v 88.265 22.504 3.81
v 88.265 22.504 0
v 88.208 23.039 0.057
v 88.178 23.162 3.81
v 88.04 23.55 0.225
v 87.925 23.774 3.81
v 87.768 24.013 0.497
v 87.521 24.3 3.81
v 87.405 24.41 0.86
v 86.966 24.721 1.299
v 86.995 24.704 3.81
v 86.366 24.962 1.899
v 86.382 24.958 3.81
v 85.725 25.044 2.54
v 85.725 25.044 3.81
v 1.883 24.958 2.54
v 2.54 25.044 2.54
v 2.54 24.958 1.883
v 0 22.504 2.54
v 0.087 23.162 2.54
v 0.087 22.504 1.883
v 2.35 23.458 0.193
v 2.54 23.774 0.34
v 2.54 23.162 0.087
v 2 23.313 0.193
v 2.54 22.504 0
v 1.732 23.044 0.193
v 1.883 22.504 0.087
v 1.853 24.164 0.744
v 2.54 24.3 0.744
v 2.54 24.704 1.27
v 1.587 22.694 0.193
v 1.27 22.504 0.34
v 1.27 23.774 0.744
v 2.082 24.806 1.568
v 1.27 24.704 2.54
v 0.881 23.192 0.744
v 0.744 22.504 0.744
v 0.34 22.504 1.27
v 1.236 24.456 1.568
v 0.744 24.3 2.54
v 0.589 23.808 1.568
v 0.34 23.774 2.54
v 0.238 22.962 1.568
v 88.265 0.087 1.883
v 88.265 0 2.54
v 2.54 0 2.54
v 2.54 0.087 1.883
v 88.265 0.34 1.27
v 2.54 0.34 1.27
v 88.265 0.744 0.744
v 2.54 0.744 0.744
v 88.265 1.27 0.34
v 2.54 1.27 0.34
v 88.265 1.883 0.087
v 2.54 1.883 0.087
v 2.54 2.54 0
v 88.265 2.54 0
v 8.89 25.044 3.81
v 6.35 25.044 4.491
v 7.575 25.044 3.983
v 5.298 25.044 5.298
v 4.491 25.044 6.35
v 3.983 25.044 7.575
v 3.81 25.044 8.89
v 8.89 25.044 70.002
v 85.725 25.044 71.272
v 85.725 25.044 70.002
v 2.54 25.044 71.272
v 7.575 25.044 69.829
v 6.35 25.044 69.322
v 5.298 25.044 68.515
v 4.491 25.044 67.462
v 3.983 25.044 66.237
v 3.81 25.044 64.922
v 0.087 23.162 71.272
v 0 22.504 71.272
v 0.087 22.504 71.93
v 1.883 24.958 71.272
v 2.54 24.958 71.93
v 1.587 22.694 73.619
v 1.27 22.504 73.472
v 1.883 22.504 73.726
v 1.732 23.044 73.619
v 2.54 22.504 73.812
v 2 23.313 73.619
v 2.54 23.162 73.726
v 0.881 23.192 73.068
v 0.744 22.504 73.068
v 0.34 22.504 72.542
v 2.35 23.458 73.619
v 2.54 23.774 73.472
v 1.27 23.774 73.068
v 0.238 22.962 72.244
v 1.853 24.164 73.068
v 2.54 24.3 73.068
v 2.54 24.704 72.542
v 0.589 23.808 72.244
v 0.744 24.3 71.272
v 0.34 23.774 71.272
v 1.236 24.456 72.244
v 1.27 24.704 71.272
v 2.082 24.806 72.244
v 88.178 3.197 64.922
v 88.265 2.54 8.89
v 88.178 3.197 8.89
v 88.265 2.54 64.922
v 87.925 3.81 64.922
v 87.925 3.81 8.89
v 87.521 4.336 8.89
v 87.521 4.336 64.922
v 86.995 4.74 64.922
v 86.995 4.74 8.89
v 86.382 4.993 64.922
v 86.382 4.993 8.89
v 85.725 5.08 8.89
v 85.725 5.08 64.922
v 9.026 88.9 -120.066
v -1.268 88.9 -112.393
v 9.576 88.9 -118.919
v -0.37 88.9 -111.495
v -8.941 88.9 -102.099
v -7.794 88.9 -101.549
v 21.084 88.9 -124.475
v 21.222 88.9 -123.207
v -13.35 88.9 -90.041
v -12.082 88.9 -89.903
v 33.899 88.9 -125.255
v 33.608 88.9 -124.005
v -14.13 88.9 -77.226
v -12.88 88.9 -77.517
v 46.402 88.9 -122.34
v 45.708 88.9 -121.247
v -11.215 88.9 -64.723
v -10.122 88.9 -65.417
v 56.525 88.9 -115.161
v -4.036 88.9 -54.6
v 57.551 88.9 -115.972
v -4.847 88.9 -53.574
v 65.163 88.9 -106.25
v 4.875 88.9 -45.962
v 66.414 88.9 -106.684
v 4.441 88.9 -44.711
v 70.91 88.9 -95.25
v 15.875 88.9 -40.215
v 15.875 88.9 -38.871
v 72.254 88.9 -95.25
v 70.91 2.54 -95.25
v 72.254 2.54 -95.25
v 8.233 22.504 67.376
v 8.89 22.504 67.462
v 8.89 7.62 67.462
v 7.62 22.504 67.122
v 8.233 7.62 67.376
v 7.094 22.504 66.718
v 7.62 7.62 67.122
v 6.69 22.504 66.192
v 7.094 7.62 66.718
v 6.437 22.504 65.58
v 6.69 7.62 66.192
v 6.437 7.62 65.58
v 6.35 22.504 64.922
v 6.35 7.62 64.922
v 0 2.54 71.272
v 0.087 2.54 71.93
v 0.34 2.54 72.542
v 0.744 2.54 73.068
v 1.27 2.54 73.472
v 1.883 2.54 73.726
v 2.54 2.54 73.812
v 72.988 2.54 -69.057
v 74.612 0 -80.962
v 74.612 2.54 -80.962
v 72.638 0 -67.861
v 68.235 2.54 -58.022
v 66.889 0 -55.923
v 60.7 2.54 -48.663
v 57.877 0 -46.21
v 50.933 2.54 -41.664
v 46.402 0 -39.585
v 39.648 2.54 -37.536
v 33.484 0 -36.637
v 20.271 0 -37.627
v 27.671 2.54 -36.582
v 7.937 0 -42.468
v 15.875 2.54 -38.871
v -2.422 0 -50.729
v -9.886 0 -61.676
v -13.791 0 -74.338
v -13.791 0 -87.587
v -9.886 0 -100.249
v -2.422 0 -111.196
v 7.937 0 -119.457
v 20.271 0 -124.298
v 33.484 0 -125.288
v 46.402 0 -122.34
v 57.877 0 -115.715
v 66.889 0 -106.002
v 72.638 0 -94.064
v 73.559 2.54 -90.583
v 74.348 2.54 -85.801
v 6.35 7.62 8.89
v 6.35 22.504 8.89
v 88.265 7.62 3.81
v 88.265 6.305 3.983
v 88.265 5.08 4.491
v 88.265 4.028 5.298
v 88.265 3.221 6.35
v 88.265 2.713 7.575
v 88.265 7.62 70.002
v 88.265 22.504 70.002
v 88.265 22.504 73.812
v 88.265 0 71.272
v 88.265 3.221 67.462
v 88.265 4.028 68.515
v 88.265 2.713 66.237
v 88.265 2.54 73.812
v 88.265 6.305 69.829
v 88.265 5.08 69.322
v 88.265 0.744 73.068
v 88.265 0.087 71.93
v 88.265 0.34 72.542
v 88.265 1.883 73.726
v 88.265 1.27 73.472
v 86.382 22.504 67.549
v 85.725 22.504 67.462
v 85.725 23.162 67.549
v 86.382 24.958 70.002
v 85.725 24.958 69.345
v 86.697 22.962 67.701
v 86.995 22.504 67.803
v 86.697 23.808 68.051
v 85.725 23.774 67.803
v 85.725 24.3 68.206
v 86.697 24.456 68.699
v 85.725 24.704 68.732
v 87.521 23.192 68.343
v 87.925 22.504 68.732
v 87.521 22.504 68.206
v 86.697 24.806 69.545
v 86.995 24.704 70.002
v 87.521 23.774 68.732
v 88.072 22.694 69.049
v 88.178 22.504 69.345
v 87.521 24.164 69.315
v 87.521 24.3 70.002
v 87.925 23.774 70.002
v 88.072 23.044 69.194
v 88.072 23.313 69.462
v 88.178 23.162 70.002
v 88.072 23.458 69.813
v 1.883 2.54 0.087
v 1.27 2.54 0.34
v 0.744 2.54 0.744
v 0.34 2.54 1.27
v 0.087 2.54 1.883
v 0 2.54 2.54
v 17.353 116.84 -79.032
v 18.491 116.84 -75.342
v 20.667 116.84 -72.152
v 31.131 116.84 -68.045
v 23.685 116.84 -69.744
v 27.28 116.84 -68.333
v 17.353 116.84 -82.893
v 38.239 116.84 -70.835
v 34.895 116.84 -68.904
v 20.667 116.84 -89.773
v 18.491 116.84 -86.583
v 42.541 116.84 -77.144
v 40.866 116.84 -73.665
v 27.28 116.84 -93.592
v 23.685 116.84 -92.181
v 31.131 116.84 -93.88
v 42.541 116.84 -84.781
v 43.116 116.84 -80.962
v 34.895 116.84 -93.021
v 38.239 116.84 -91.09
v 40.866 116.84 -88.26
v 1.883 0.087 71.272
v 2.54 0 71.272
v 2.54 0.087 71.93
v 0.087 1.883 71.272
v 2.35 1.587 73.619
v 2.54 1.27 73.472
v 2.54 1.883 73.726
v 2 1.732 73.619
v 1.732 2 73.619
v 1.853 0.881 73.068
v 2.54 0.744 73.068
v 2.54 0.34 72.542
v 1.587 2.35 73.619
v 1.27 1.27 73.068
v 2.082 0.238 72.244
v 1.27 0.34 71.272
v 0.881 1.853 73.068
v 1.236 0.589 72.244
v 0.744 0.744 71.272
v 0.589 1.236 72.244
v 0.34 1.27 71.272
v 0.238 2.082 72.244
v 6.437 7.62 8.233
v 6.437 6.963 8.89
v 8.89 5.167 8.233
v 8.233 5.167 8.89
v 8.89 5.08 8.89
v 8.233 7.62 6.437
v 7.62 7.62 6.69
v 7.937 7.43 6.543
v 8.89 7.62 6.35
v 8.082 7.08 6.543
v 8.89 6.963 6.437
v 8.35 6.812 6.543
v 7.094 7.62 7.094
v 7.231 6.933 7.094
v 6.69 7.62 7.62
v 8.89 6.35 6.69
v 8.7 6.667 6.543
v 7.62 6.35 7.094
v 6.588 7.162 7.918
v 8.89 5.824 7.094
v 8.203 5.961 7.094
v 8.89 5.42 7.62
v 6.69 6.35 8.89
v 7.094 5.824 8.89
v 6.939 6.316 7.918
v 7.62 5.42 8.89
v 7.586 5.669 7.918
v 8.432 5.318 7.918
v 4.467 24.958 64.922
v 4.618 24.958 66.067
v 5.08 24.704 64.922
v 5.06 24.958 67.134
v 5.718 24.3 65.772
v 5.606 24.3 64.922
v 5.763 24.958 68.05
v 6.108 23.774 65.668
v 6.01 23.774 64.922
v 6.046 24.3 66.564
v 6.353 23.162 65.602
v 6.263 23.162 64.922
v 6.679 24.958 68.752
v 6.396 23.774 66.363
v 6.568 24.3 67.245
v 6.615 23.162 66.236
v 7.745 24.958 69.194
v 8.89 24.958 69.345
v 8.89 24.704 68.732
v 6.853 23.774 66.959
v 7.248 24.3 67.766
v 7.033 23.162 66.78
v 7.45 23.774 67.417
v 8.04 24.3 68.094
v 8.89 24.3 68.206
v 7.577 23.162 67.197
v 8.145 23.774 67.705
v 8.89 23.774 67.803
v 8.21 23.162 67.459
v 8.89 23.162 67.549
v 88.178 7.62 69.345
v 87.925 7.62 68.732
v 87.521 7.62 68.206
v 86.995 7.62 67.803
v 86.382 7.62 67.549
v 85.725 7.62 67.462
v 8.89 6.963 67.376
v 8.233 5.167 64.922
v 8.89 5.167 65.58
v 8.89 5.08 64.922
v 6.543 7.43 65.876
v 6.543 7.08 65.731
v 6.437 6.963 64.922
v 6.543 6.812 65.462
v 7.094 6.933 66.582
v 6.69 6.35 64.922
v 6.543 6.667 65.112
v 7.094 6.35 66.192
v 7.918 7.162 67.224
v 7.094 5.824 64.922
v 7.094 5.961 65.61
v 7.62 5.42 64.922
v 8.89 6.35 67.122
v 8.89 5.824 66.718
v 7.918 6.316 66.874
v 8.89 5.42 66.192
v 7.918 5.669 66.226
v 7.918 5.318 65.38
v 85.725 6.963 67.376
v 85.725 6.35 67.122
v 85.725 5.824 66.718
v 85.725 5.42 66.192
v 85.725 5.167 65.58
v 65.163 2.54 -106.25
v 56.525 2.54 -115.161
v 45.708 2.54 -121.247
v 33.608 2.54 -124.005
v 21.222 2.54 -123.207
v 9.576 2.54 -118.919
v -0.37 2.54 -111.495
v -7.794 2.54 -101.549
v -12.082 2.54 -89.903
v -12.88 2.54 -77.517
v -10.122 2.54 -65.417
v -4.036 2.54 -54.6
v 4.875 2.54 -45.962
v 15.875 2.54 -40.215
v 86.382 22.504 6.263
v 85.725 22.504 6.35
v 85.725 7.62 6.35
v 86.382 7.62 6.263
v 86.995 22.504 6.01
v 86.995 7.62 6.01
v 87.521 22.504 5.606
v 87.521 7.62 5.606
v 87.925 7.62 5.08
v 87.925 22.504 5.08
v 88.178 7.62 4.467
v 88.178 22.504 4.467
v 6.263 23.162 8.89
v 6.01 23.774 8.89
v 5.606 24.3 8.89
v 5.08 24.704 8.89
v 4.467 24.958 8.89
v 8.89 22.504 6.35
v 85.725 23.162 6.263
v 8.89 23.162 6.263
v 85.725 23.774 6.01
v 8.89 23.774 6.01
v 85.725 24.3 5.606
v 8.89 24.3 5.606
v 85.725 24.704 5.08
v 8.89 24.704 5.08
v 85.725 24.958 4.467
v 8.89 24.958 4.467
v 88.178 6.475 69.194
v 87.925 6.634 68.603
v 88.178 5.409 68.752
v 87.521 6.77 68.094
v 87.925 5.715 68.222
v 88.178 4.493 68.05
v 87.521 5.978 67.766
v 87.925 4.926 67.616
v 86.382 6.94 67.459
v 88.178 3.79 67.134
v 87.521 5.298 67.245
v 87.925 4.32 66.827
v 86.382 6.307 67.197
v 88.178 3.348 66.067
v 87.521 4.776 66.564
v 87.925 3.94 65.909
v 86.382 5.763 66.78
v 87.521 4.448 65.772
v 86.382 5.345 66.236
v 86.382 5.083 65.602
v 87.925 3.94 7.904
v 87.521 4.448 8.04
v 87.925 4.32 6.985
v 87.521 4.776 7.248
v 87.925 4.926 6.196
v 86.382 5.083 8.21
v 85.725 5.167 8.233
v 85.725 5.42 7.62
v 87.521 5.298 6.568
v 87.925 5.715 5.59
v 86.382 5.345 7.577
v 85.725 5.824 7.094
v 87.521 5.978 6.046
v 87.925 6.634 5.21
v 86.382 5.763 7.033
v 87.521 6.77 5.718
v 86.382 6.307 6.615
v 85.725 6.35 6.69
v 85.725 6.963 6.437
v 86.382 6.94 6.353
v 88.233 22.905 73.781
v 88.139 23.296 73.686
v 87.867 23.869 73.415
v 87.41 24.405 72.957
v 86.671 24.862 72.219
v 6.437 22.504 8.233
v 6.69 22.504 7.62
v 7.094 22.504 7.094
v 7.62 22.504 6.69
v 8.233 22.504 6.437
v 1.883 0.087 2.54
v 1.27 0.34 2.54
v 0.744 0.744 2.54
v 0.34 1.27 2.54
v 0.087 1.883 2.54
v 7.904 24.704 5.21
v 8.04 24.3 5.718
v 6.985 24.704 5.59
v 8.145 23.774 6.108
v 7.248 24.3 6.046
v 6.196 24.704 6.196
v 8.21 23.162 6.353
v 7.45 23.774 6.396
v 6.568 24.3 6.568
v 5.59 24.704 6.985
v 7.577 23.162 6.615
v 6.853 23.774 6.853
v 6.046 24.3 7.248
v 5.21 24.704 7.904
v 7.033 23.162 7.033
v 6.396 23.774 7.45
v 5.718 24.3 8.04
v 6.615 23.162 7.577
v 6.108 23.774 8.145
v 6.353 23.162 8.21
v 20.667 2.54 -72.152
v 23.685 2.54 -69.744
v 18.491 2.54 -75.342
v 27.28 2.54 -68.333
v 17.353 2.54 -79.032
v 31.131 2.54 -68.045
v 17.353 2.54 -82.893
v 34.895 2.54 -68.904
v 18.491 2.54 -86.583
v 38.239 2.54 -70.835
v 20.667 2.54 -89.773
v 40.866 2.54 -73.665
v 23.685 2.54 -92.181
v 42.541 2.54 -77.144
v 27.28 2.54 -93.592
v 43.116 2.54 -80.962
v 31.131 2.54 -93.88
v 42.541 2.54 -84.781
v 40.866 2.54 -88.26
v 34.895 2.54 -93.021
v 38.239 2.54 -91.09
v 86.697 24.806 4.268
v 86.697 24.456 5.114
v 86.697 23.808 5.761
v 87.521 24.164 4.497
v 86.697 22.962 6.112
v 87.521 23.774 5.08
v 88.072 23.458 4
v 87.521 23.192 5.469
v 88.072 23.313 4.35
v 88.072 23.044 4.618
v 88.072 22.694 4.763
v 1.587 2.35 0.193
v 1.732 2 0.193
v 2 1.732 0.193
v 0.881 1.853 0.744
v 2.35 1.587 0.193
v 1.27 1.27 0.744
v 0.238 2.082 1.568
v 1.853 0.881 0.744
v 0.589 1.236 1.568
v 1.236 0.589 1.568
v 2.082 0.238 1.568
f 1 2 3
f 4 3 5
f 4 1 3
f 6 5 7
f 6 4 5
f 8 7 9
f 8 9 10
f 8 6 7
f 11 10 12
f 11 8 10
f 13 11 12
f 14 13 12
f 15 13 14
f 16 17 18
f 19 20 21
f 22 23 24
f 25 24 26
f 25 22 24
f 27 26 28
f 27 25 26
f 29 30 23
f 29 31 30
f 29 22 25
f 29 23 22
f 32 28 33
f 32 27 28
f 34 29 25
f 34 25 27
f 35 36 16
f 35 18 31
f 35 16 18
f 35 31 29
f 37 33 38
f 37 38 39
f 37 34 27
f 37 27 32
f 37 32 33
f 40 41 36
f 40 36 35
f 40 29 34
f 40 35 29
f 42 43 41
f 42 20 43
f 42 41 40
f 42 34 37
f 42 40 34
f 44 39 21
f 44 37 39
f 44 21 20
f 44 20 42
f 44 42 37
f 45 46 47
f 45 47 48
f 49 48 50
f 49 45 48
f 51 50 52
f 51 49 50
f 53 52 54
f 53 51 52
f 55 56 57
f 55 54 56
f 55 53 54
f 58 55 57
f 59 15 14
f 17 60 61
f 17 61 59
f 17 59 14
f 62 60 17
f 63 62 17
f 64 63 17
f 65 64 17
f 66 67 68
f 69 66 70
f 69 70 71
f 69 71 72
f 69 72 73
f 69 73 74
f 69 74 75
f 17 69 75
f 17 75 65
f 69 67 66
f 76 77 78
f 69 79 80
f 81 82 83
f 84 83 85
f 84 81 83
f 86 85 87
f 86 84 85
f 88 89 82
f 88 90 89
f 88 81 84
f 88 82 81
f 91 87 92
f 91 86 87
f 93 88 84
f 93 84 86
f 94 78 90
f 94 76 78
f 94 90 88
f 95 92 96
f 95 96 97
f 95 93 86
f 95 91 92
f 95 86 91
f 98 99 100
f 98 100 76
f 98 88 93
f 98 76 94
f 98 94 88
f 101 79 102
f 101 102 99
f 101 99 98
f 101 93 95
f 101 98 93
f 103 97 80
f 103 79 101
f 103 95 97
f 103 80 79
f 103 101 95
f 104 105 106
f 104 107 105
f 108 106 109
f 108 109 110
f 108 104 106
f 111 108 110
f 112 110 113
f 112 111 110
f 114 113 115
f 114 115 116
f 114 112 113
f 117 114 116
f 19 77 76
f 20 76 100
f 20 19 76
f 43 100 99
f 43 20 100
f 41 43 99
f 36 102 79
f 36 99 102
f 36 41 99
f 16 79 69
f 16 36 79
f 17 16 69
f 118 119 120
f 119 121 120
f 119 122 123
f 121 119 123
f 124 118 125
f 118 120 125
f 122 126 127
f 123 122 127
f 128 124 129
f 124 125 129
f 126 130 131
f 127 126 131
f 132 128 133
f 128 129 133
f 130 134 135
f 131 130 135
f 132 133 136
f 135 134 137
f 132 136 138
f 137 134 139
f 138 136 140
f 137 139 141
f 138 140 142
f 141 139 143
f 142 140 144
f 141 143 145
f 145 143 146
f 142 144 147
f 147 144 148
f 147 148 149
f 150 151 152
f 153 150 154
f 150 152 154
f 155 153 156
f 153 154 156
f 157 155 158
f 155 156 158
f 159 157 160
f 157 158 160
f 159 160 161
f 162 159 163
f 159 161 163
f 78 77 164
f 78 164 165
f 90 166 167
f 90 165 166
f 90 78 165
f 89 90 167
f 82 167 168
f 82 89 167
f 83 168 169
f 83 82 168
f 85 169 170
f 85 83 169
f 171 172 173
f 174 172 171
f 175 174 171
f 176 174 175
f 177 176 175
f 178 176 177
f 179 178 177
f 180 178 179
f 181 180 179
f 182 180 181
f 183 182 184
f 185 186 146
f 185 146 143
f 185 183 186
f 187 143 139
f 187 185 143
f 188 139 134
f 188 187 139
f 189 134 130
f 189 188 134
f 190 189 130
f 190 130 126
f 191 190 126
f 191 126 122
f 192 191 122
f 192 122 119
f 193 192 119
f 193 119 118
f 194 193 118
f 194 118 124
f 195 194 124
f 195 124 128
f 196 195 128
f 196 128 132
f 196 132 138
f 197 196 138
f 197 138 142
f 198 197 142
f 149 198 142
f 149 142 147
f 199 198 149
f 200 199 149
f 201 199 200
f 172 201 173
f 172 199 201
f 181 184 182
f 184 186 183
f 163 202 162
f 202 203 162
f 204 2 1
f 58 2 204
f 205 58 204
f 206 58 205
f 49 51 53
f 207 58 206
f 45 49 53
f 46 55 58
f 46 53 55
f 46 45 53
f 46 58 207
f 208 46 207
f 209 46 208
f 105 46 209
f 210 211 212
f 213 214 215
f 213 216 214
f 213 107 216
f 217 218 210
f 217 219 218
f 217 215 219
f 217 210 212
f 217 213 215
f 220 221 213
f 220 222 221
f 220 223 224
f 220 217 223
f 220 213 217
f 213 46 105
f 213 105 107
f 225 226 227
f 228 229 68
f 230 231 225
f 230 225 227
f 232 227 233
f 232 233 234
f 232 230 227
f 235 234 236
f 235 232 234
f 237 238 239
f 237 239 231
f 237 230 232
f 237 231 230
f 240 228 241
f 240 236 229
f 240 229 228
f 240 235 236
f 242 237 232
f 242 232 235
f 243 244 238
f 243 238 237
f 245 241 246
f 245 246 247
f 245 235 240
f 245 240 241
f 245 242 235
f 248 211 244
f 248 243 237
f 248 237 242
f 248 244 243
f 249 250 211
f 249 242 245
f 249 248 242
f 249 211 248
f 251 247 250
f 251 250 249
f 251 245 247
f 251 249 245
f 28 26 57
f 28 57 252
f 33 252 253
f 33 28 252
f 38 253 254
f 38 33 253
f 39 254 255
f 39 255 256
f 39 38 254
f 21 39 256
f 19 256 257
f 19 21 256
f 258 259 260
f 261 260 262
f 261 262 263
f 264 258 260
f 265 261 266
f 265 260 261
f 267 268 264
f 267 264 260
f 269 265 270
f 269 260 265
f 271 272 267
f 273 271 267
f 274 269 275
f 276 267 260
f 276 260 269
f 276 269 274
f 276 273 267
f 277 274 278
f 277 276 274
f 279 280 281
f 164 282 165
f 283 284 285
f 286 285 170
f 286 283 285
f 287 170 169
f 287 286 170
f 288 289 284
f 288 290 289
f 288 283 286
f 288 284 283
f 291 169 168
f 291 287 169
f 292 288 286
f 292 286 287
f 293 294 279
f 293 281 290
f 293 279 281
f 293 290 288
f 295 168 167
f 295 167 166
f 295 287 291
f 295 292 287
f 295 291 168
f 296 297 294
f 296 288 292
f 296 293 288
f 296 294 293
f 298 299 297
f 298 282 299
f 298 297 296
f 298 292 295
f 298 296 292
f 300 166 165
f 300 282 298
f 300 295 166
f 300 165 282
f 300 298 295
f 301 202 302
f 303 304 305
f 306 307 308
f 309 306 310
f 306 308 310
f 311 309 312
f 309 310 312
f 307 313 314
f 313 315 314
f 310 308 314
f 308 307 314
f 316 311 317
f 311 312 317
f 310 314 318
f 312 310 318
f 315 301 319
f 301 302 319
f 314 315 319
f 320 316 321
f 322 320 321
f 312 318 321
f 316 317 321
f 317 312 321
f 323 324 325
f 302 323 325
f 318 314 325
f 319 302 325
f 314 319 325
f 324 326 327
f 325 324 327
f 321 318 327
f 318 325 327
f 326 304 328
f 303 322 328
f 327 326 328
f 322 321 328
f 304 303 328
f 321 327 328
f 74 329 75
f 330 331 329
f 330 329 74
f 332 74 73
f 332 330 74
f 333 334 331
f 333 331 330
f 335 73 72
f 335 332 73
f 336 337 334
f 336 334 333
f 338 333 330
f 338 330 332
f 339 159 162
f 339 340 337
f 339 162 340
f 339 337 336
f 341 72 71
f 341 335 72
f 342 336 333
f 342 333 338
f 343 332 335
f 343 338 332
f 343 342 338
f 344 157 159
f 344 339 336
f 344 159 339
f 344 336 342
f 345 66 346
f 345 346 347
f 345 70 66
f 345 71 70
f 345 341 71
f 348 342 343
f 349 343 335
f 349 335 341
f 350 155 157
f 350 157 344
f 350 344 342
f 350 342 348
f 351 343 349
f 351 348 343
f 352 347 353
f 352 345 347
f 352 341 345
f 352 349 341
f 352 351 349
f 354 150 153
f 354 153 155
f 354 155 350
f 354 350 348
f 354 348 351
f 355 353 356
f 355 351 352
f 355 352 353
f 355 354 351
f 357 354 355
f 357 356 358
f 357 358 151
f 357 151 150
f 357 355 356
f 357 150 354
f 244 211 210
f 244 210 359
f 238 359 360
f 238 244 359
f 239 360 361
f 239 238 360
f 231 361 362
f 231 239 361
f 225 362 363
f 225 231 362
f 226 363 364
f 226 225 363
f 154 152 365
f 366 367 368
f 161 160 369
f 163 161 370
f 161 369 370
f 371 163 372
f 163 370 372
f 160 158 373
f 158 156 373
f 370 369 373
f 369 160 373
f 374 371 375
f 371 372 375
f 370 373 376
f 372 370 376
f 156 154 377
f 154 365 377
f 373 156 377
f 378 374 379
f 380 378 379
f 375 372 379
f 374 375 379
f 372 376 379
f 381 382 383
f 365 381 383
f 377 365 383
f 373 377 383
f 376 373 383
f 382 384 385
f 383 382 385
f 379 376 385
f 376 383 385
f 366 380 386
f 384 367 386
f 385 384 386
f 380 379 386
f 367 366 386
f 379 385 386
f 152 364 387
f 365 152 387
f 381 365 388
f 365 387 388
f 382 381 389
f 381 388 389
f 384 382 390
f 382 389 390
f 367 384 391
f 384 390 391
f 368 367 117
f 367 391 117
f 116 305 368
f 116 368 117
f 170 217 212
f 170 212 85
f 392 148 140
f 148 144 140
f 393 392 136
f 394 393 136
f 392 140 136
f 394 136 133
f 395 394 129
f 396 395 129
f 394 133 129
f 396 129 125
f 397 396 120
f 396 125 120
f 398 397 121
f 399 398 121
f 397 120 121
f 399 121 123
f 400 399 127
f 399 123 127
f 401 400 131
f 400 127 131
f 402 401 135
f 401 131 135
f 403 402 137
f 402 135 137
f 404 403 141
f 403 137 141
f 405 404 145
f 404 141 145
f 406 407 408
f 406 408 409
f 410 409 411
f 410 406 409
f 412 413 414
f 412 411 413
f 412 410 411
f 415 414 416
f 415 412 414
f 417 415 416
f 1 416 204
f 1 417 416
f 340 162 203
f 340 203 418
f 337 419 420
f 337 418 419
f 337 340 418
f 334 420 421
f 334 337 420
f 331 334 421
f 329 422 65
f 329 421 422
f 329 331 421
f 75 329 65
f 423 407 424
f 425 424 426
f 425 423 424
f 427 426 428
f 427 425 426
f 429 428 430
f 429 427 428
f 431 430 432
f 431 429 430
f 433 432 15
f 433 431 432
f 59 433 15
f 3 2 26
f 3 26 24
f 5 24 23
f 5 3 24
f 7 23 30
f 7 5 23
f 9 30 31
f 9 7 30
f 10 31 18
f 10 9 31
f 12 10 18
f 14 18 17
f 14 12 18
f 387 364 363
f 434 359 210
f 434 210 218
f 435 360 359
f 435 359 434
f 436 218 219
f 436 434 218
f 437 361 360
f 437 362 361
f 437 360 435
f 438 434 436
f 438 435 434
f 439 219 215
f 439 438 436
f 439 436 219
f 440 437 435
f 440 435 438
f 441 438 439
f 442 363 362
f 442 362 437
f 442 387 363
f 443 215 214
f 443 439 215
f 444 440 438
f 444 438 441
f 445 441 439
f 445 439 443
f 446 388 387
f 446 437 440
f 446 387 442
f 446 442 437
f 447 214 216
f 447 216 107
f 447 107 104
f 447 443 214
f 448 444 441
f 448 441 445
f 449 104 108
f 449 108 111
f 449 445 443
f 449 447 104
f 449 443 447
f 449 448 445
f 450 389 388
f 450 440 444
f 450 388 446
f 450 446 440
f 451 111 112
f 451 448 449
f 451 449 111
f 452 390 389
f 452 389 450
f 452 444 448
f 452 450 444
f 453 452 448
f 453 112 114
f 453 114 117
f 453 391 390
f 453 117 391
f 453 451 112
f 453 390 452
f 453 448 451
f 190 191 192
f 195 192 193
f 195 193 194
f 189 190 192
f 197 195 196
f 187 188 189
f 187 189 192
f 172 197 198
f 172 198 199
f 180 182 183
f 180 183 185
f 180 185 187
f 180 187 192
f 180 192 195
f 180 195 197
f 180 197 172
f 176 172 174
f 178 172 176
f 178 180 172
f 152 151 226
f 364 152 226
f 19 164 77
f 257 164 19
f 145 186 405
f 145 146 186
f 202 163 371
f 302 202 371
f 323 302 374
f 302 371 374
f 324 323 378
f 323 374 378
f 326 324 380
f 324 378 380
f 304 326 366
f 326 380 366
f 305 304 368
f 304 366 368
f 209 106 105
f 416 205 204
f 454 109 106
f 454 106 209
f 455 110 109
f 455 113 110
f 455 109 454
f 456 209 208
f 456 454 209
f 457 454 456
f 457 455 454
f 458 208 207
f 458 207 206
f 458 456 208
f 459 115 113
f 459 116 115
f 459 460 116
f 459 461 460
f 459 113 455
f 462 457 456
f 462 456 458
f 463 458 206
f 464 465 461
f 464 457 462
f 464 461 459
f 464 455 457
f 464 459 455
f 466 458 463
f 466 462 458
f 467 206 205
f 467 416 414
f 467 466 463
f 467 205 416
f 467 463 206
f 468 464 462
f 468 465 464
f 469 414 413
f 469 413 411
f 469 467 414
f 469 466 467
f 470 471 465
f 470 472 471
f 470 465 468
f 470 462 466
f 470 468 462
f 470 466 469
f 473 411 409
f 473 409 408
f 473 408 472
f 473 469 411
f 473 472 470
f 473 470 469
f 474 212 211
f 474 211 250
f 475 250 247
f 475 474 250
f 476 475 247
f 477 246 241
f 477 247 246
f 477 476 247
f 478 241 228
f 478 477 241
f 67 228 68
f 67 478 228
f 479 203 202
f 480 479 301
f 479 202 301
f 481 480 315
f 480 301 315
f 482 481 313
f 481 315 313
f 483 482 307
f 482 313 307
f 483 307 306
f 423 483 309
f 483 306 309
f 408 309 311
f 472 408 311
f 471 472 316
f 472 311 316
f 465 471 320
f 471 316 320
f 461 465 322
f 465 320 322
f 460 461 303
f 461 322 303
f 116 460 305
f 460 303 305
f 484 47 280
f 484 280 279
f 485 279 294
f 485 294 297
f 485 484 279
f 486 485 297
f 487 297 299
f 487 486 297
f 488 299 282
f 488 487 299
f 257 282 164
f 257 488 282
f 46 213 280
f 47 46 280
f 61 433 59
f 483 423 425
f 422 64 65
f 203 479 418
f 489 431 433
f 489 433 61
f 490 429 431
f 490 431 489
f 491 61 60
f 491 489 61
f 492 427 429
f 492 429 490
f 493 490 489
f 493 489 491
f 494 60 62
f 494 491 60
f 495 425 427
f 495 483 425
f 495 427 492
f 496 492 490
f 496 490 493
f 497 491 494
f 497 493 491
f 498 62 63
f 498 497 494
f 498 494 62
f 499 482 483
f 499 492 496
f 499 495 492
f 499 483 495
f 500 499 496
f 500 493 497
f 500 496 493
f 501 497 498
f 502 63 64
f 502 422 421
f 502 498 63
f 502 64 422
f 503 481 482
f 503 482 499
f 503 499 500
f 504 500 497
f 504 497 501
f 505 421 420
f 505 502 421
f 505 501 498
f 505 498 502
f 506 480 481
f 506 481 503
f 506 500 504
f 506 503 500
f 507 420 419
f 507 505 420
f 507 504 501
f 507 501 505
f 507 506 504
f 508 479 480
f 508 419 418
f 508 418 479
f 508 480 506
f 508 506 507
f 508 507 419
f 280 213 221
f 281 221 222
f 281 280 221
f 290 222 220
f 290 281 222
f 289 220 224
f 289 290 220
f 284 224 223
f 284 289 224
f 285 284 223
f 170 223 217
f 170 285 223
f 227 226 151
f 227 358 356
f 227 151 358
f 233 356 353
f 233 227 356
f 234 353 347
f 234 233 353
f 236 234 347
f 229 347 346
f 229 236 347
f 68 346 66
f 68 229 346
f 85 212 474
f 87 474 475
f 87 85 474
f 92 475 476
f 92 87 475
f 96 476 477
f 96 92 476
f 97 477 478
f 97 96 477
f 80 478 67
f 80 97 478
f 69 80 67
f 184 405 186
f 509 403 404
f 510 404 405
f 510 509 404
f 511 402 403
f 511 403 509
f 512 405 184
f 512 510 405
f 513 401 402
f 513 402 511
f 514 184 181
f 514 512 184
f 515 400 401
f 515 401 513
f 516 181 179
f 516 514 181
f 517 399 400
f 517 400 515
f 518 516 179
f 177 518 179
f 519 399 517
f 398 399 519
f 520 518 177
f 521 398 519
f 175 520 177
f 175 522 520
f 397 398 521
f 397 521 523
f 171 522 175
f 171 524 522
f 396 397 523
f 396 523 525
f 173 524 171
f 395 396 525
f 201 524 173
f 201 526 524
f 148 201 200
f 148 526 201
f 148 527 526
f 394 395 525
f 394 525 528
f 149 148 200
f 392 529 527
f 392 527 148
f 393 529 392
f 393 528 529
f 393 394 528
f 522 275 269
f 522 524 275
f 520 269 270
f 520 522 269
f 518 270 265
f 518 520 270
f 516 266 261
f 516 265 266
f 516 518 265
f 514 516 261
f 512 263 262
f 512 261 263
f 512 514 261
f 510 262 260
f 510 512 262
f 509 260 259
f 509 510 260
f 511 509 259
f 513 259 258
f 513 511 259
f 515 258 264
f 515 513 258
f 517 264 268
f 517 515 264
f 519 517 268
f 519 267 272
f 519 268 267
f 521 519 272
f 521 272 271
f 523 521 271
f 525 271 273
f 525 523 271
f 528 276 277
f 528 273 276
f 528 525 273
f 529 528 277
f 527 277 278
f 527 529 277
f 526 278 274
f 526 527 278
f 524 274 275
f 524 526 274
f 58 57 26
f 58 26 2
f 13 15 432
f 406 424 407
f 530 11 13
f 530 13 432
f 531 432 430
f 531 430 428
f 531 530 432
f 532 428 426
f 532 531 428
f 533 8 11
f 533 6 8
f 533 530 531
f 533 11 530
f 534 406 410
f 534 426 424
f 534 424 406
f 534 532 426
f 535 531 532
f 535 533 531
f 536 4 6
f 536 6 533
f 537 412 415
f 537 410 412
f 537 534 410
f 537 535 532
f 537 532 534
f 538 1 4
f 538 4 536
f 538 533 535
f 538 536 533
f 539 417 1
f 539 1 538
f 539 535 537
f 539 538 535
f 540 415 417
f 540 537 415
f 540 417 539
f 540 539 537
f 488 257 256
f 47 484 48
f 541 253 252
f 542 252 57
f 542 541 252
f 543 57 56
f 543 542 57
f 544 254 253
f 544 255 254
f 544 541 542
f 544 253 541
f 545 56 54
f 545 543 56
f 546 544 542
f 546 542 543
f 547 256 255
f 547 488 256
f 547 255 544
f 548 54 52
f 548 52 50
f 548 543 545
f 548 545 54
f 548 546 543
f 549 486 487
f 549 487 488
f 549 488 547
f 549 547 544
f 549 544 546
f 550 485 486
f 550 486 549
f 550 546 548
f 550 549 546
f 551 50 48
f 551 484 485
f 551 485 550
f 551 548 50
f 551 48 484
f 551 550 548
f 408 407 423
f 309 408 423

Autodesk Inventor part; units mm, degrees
ref_plane "YZ Plane" through (0, 0, 0) normal (1, 0, 0) x (0, 1, 0)
ref_plane "XZ Plane" through (0, 0, 0) normal (0, 1, 0) x (-1, 0, 0)
ref_plane "XY Plane" through (0, 0, 0) normal (0, 0, 1) x (1, 0, 0)
sketch "Sketch1" plane through (0, 0, 0) normal (0, 1, 0) x (-1, 0, 0)
  line L0 (0, 0) -> (-88.265, 0)
  line L1 (-88.265, 0) -> (-88.265, 73.8124)
  line L2 (-88.265, 73.8124) -> (0, 73.8124)
  line L3 (0, 73.8124) -> (0, 0)
  dimension "d0" = 88.265
  dimension "d1" = 73.8124
extrude "Extrusion1" add sketch "Sketch1" along normal blind 25.0444
sketch "Sketch2" plane through (0, 25.0444, 0) normal (0, 1, 0) x (1, 0, 0)
  line L0 (88.265, -6.35) -> (6.35, -6.35)
  line L1 (6.35, -6.35) -> (6.35, -67.4624)
  line L2 (6.35, -67.4624) -> (88.265, -67.4624)
  line L3 (88.265, -67.4624) -> (88.265, -6.35)
  line L4 (88.265, -73.8124) -> (88.265, 0) projected
  line L5 (0, 0) -> (0, -73.8124) projected
  line L6 (88.265, 0) -> (0, 0) projected
  line L7 (0, -73.8124) -> (88.265, -73.8124) projected
  dimension "d4" = 0
  dimension "d5" = 6.35
  dimension "d6" = 6.35
  dimension "d7" = 6.35
extrude "Extrusion2" cut sketch "Sketch2" against normal blind 19.9644 contours L3 L2 L1 L0
fillet "Fillet1" radius 2.54 18 edges at (47.3075, 5.08, 67.4624) (6.35, 5.08, 36.9062) (47.3075, 5.08, 6.35) (0, 0, 36.9062) (0, 25.0444, 36.9062) (44.1325, 0, 0) (44.1325, 25.0444, 0) (47.3075, 25.0444, 67.4624) (44.1325, 25.0444, 73.8124) (6.35, 25.0444, 36.9062) (88.265, 25.0444, 70.6374) (88.265, 25.0444, 3.175) (47.3075, 25.0444, 6.35) (44.1325, 0, 73.8124) (6.35, 15.0622, 6.35) (6.35, 15.0622, 67.4624) (0, 12.5222, 0) (0, 12.5222, 73.8124)
fillet "Fillet2" radius 2.54 7 edges at (88.265, 5.8239, 7.0939) (88.265, 5.08, 36.9062) (88.265, 5.8239, 66.7185) (88.265, 15.0622, 67.4624) (87.5211, 24.3005, 68.2063) (87.5211, 24.3005, 5.6061) (88.265, 15.0622, 6.35)
sketch "Sketch3" plane through (0, 0, 0) normal (0, -1, 0) x (1, 0, 0)
  circle A0 centre (30.1625, -80.9625) radius 44.45
  point P0 (0, 0)
  dimension "d12" = 88.9
extrude "Extrusion3" add sketch "Sketch3" against normal blind 88.9
sketch "Sketch4" plane through (30.1625, 88.9, -80.9625) normal (0, 1, 0) x (1, 0, 0)
  circle A0 centre (0, 0) radius 43.18
  point P0 (-30.1625, -80.9625)
  dimension "d15" = 86.36
extrude "Extrusion4" cut sketch "Sketch4" against normal blind 86.36
sketch "Sketch5" plane through (30.1625, 88.9, -80.9625) normal (0, 1, 0) x (1, 0, 0)
  line L0 (44.45, 0) -> (44.45, -44.45)
  line L1 (44.45, -44.45) -> (0, -44.45)
  line L2 (44.45, -44.45) -> (-14.2875, -44.45)
  line L3 (-14.2875, -44.45) -> (-14.2875, 14.2875)
  line L4 (-14.2875, 14.2875) -> (44.45, 14.2875)
  line L5 (44.45, 14.2875) -> (44.45, -44.45)
  point P0 (-30.1625, -80.9625)
extrude "Extrusion5" cut sketch "Sketch5" against normal blind 86.36
sketch "Sketch6" plane through (30.1625, 2.54, -80.9625) normal (0, 1, 0) x (1, 0, 0)
  circle A0 centre (0, 0) radius 12.954
  point P0 (-30.1625, -80.9625)
  dimension "d20" = 25.908
extrude "Extrusion6" add sketch "Sketch6" along normal blind 114.3
sketch "Sketch7" plane through (6.35, 7.62, 64.9224) normal (1, 0, 0) x (0, 0, -1)
  circle A0 centre (146.05, 102.87) radius 2.54
  line L0 (158.8389, 109.22) -> (132.9309, 109.22) projected
  point P0 (64.9224, -7.62)
  dimension "d23" = 5.08
  dimension "d24" = 6.35
properties part number "Nicole's Ideas"
